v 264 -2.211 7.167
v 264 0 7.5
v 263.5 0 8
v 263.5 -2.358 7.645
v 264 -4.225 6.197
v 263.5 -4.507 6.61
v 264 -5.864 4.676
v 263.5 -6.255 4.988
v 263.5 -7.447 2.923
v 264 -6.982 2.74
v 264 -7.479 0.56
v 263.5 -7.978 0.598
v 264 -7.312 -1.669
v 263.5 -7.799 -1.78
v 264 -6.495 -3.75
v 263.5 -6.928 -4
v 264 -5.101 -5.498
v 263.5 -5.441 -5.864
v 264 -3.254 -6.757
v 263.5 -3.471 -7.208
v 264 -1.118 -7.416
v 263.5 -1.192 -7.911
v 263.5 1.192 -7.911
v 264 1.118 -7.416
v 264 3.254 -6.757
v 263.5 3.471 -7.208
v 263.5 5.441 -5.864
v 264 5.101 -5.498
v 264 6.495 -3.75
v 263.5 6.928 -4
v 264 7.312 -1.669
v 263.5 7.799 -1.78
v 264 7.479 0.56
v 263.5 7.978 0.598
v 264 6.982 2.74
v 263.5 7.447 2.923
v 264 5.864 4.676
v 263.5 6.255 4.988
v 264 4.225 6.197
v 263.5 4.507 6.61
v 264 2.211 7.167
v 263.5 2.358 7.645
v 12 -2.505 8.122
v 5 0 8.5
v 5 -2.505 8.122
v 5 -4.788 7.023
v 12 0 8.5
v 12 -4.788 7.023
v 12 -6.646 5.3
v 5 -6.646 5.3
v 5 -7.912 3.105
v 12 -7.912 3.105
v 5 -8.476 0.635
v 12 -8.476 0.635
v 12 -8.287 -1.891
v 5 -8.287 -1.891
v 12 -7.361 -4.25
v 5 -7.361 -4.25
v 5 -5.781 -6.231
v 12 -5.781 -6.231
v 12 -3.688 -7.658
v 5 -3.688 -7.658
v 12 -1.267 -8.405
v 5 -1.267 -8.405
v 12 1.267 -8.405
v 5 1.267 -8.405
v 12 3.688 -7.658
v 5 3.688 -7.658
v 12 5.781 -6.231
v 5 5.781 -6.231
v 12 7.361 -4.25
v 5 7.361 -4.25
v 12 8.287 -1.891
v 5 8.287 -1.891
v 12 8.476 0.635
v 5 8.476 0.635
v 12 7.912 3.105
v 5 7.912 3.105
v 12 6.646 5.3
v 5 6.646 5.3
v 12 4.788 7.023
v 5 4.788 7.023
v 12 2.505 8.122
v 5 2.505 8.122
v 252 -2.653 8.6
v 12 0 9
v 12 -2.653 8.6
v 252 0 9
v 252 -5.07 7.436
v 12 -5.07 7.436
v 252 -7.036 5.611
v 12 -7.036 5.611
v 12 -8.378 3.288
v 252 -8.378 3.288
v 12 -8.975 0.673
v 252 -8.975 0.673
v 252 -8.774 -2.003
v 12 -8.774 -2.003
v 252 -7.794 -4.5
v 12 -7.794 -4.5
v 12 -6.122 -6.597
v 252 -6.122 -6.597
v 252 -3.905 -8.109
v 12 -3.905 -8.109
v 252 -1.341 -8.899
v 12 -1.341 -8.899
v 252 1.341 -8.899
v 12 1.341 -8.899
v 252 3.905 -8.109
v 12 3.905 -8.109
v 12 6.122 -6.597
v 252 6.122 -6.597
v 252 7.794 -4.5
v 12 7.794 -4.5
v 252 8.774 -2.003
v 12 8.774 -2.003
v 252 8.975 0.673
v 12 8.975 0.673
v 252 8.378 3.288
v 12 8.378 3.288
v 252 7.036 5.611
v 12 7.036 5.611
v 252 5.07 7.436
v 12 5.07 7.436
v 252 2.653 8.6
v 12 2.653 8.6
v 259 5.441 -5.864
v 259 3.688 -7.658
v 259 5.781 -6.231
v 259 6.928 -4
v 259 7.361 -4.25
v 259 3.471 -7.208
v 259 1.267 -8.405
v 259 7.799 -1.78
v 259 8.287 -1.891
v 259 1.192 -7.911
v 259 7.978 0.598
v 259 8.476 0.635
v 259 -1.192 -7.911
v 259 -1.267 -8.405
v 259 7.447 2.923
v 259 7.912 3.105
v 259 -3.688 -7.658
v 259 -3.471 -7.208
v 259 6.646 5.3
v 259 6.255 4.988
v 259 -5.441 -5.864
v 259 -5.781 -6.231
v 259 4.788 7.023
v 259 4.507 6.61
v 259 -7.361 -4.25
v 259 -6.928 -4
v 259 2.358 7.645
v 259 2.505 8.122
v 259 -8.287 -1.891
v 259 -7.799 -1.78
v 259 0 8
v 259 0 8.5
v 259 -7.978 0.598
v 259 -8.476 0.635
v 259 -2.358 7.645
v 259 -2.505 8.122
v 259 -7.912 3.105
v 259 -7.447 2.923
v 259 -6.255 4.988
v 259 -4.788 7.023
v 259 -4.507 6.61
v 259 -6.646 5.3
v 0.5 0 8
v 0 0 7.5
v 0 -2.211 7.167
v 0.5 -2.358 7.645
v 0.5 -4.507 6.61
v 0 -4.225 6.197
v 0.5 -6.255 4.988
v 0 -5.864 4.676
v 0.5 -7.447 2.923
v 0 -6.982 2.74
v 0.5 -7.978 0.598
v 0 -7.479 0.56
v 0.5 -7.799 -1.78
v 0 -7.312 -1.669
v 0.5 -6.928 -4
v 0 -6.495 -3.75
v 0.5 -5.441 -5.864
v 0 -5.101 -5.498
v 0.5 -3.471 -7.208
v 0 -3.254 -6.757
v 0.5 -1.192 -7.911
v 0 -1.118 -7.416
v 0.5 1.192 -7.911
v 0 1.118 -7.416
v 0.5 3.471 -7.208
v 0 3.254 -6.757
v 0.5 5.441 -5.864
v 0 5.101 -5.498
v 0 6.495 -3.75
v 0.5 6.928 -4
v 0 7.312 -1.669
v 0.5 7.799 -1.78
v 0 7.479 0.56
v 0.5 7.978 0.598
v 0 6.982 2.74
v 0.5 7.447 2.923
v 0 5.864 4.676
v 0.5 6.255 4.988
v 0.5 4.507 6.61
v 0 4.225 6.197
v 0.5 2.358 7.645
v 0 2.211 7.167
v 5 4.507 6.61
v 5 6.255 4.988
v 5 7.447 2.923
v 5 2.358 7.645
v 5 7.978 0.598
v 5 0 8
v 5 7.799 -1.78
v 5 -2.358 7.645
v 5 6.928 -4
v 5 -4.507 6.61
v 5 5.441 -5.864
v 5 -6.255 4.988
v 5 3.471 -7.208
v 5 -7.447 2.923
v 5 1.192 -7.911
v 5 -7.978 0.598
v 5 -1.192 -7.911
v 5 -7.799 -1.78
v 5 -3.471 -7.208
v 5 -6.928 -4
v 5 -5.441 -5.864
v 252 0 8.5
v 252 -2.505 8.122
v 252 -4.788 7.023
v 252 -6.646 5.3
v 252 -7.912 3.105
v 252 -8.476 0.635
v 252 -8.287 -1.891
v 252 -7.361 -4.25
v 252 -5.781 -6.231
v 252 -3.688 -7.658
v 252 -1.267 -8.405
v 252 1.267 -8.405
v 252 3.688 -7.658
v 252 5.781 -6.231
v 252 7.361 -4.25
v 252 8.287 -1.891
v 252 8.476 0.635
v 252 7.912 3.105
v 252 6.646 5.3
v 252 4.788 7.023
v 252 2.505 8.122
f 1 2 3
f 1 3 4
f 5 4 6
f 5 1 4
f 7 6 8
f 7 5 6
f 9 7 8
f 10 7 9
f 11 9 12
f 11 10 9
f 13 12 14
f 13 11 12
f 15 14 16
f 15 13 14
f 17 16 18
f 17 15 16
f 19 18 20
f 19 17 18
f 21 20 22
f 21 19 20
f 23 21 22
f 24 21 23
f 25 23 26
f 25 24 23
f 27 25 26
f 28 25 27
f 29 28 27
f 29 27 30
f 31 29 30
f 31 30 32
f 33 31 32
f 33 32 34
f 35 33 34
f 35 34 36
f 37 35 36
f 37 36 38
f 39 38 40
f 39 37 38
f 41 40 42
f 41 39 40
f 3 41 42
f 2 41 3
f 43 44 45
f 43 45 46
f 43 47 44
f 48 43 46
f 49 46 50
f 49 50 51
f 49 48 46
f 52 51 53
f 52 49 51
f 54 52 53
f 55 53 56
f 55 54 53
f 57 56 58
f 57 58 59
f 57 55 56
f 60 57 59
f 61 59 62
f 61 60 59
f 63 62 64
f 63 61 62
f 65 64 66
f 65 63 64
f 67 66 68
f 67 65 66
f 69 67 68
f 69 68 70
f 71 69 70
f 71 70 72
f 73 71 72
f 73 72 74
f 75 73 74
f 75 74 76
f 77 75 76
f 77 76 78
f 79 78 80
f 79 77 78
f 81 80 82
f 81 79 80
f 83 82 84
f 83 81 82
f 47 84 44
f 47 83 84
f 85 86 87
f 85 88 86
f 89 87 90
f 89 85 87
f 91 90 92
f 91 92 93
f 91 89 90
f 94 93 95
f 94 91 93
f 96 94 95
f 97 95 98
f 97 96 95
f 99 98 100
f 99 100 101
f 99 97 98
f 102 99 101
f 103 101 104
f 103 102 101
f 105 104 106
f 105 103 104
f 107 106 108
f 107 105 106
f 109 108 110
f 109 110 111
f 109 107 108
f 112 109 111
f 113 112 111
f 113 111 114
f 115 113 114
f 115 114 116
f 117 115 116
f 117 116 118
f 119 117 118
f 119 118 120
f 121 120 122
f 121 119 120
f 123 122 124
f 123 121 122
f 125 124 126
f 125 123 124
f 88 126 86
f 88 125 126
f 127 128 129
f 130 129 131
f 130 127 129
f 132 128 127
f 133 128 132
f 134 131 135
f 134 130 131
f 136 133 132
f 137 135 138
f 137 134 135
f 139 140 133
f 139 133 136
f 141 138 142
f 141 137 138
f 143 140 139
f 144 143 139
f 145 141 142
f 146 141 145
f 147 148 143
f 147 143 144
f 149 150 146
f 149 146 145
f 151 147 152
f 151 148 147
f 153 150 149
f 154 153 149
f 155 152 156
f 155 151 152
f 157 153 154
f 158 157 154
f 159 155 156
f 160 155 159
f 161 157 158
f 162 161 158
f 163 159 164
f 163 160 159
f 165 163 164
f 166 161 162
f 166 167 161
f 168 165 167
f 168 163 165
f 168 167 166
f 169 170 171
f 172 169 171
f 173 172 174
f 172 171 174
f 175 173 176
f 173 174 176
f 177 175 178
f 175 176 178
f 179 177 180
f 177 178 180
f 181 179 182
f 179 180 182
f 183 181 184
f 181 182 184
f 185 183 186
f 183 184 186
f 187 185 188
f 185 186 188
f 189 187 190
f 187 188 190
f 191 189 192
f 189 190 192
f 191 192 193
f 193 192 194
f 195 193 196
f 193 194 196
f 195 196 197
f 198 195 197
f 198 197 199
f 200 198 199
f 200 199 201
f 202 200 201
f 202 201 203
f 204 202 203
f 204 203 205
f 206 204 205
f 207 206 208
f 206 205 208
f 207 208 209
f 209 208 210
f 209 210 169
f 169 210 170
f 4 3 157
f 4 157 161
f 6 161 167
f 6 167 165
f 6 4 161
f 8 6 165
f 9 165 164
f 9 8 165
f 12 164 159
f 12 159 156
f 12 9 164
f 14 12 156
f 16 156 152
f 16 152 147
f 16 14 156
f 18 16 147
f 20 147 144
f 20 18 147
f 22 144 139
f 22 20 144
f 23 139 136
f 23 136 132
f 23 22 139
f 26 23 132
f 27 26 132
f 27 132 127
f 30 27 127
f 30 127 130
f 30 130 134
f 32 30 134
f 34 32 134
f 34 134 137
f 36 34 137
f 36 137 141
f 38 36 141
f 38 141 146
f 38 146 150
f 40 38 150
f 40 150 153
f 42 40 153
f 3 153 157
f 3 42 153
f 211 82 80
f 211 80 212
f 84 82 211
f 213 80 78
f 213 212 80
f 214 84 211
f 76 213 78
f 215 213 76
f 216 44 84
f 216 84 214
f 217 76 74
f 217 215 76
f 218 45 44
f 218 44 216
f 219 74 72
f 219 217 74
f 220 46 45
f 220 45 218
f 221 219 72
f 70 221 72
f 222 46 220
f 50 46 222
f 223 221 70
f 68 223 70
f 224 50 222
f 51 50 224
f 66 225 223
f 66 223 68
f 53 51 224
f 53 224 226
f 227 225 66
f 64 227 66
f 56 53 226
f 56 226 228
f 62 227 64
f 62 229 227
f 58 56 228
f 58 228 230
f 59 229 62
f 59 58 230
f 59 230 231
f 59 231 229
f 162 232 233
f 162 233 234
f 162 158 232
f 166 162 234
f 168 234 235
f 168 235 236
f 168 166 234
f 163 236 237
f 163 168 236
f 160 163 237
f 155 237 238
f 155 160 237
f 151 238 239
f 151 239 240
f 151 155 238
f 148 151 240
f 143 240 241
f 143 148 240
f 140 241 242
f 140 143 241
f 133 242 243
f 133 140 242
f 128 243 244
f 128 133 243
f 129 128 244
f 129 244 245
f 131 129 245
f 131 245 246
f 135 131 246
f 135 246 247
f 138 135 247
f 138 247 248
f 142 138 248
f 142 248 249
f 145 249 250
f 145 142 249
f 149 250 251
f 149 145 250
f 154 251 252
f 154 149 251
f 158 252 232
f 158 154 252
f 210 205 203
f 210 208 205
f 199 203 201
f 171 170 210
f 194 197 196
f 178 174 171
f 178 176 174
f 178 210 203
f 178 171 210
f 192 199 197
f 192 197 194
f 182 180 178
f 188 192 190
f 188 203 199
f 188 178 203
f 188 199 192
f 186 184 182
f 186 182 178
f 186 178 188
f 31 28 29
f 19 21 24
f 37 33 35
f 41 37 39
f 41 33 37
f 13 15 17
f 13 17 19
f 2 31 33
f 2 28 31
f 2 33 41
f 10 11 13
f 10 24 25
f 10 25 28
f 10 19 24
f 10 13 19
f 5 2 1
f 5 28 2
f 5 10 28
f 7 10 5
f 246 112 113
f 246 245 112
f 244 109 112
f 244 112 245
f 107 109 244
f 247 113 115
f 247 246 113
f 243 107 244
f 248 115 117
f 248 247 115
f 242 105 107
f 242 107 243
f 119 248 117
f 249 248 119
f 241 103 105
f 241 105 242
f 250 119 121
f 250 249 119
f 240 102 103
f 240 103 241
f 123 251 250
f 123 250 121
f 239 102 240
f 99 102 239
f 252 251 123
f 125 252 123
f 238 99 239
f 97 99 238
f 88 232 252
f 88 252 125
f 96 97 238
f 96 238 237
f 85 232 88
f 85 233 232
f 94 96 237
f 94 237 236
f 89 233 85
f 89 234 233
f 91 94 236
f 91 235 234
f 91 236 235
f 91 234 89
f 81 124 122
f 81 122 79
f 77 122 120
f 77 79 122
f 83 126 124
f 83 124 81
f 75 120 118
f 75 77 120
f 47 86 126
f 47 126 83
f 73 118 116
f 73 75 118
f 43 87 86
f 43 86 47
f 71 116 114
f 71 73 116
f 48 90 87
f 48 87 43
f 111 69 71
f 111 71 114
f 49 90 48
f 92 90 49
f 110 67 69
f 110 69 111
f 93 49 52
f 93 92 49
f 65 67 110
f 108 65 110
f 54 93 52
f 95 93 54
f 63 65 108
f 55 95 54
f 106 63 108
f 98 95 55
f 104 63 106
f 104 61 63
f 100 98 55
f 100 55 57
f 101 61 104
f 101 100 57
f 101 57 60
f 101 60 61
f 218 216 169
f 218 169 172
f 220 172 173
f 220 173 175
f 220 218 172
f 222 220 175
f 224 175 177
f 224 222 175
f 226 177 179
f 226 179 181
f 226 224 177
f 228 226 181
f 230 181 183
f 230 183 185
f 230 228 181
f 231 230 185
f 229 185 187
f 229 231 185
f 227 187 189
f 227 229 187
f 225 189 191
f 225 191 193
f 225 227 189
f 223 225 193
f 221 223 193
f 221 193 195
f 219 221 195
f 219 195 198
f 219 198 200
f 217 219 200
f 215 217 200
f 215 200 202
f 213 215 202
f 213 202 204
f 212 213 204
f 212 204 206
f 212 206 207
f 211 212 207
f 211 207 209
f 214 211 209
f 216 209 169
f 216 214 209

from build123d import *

# Parameters (mm, degrees)
CHAMFER_1_SIZE = 0.5
CHAMFER_2_SIZE = 0.5


with BuildPart() as part:
    # 草图1 → 旋转1 (revolve)
    with BuildSketch(Plane(origin=(0, 0, 0), x_dir=(1, 0, 0), z_dir=(0, 1, 0)), mode=Mode.PRIVATE) as revolve_1_sk:
        Polygon((0, 0), (0, 8), (5, 8), (5, 8.5), (12, 8.5), (12, 9), (252, 9), (252, 8.5), (259, 8.5), (259, 8), (264, 8), (264, 0), align=None)
    revolve(revolve_1_sk.sketch.rotate(Axis((-102.487167665, 0, 0), (1, 0, 0)), 180), axis=Axis((-102.487167665, 0, 0), (1, 0, 0)))

    # 倒角1
    chamfer_1_edges = [part.edges().sort_by_distance(p)[0] for p in [
        (264, 0, -8),
    ]]
    chamfer(chamfer_1_edges, length=CHAMFER_1_SIZE)

    # 倒角2
    chamfer_2_edges = [part.edges().sort_by_distance(p)[0] for p in [
        (0, 0, -8),
    ]]
    chamfer(chamfer_2_edges, length=CHAMFER_2_SIZE)


solid = part.part
